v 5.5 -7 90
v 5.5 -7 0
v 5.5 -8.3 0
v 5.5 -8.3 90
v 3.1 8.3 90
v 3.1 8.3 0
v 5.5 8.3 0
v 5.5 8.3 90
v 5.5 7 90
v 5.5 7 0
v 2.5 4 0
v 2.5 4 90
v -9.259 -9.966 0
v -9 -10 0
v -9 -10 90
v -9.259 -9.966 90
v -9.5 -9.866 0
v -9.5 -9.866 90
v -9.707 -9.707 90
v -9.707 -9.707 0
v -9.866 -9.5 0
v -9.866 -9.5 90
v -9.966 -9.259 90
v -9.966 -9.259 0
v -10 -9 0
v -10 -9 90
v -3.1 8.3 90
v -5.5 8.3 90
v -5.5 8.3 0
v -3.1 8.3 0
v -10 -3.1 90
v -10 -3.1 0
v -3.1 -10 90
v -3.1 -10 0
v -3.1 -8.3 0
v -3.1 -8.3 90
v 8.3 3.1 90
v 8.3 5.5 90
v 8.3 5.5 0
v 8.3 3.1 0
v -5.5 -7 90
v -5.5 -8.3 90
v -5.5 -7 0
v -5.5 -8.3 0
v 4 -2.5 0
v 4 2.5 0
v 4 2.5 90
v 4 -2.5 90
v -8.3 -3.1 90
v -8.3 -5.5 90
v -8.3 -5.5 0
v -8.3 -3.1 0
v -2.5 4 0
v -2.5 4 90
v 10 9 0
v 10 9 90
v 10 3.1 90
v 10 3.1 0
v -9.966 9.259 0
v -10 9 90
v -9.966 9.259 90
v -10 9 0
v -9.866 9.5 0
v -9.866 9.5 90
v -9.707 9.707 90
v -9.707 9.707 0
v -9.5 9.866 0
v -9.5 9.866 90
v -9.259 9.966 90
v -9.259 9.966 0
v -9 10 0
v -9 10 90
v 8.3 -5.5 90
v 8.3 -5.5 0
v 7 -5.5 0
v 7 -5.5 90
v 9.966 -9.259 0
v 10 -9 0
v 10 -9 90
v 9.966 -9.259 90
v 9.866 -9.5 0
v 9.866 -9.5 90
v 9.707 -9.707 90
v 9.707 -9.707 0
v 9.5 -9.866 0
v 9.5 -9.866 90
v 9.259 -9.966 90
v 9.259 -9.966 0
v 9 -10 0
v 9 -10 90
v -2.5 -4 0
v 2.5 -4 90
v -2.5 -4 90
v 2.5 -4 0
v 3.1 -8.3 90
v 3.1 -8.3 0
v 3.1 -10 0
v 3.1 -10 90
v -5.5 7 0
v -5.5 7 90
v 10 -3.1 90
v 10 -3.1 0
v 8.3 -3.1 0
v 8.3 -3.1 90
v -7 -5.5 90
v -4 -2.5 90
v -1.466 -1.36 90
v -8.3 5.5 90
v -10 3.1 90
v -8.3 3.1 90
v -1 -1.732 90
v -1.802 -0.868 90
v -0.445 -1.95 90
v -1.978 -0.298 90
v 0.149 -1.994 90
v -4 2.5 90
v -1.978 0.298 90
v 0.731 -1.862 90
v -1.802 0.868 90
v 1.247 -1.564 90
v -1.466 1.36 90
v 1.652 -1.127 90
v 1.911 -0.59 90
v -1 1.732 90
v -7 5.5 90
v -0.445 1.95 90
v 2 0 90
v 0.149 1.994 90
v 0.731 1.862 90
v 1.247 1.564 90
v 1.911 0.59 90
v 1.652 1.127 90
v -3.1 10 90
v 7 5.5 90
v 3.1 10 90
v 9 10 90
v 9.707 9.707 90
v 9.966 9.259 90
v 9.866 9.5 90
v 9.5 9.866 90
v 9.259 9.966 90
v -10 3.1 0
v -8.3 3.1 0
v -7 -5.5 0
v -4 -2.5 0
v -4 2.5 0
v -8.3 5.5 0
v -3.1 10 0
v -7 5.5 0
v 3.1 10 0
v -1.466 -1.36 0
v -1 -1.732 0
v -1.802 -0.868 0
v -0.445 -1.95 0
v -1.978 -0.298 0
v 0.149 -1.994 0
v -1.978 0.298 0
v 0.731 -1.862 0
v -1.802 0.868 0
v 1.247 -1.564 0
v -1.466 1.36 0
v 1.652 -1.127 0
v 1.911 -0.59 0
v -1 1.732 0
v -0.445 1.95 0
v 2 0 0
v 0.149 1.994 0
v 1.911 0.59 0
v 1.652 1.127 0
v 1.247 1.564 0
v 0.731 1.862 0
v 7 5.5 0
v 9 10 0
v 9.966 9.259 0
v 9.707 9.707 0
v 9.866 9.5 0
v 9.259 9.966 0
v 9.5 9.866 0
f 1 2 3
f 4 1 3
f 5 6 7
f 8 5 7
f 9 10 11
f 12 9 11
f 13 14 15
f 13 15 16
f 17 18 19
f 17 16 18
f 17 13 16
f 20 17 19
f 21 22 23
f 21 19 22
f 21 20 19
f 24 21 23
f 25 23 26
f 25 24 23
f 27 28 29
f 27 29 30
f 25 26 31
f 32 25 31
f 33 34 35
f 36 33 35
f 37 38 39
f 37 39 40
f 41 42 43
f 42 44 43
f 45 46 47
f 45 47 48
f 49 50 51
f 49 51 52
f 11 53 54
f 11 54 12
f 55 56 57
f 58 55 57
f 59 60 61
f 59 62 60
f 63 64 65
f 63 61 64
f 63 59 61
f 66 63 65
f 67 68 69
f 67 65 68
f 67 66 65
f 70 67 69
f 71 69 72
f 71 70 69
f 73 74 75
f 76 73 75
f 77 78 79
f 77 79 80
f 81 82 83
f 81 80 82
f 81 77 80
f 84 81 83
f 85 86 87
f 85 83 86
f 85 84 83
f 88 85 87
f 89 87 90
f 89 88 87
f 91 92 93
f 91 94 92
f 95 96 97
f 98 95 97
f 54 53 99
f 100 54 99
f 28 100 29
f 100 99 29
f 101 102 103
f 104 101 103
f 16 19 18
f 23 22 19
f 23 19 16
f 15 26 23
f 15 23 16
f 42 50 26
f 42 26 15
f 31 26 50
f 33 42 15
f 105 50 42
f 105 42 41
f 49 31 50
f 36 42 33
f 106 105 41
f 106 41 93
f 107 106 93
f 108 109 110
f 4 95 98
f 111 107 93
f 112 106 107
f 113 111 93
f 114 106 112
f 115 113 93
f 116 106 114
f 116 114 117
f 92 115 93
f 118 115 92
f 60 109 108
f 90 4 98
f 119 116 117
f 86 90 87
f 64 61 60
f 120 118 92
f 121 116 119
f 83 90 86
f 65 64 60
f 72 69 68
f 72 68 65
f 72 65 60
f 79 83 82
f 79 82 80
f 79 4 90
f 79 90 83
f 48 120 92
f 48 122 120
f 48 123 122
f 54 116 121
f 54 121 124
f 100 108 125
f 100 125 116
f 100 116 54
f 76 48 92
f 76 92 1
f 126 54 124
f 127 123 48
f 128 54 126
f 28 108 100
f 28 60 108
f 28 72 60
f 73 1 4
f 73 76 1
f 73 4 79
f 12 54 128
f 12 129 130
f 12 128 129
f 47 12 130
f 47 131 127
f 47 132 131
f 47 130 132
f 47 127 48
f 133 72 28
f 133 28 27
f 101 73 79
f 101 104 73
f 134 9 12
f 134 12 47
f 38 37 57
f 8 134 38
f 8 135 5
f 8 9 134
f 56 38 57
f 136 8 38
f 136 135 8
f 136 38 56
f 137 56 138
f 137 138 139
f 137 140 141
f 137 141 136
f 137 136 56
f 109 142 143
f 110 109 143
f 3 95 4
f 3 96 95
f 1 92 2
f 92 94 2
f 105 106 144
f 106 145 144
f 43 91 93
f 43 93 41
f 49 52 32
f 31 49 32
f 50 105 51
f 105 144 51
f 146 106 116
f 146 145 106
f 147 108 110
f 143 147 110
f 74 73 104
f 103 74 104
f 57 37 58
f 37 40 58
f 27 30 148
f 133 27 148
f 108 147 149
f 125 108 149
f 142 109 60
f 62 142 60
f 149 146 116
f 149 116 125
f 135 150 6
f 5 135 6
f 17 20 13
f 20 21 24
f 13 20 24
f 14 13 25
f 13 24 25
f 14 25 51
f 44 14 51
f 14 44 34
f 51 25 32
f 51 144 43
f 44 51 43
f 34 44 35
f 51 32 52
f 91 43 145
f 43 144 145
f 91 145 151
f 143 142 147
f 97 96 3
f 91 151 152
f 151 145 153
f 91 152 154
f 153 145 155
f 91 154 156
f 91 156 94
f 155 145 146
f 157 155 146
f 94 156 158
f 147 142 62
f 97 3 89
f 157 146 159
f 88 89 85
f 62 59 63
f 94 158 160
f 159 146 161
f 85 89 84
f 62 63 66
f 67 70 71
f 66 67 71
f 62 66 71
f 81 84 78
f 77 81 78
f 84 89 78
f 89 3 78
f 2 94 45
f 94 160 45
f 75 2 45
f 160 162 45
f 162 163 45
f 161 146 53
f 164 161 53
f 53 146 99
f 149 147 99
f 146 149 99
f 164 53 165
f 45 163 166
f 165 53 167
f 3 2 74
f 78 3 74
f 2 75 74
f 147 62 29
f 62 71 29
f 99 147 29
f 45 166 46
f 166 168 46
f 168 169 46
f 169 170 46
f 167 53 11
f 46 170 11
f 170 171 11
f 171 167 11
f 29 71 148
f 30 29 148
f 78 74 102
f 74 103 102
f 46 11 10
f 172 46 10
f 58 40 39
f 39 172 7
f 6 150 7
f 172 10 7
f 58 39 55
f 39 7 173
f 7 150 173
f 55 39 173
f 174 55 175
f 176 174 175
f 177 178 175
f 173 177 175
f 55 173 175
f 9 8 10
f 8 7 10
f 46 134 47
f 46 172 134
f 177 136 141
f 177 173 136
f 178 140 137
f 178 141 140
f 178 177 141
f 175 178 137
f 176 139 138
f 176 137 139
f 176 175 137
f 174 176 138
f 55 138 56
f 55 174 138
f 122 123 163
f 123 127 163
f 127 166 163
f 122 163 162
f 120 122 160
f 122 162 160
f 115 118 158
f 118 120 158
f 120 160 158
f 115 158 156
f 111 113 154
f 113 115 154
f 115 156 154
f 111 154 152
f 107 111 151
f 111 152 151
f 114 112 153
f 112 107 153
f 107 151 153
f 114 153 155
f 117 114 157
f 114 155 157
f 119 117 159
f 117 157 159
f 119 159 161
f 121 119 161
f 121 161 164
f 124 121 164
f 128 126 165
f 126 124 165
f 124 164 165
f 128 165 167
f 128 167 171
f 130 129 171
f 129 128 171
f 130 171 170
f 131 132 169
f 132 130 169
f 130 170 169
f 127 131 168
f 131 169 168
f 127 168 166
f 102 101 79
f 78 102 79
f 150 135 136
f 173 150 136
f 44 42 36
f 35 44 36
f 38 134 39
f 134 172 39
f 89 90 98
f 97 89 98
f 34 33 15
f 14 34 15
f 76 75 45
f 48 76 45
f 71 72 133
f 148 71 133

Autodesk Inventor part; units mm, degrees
ref_plane "YZ Plane" through (0, 0, 0) normal (1, 0, 0) x (0, 1, 0)
ref_plane "XZ Plane" through (0, 0, 0) normal (0, 1, 0) x (-1, 0, 0)
ref_plane "XY Plane" through (0, 0, 0) normal (0, 0, 1) x (1, 0, 0)
sketch "Sketch1" plane through (0, 0, 0) normal (0, 0, 1) x (1, 0, 0)
  line L0 (-9, 10) -> (9, 10)
  line L1 (10, 9) -> (10, -9)
  line L2 (9, -10) -> (-9, -10)
  line L3 (-10, -9) -> (-10, 9)
  line L4 (-10, 10) -> (10, -10) construction
  line L5 (10, 10) -> (-10, -10) construction
  circle A0 centre (0, 0) radius 2
  line L6 (-4, 4) -> (4, 4)
  line L7 (4, 4) -> (4, -4)
  line L8 (4, -4) -> (-4, -4)
  line L9 (-4, -4) -> (-4, 4)
  line L10 (-4, 4) -> (4, -4) construction
  line L11 (4, 4) -> (-4, -4) construction
  arc A1 (-9, 10) -> (-10, 9) centre (-9, 9) ccw
  arc A2 (10, 9) -> (9, 10) centre (9, 9) ccw
  arc A3 (9, -10) -> (10, -9) centre (9, -9) ccw
  arc A4 (-10, -9) -> (-9, -10) centre (-9, -9) ccw
  line L12 (-3.1, 10) -> (3.1, 10)
  line L13 (3.1, 10) -> (3.1, -10)
  line L14 (3.1, -10) -> (-3.1, -10)
  line L15 (-3.1, -10) -> (-3.1, 10)
  line L16 (-10, 3.1) -> (10, 3.1)
  line L17 (10, 3.1) -> (10, -3.1)
  line L18 (10, -3.1) -> (-10, -3.1)
  line L19 (-10, -3.1) -> (-10, 3.1)
  line L20 (-5.5, 10) -> (5.5, 10)
  line L21 (5.5, 10) -> (5.5, -10)
  line L22 (5.5, -10) -> (-5.5, -10)
  line L23 (-5.5, -10) -> (-5.5, 10)
  line L24 (-10, 5.5) -> (10, 5.5)
  line L25 (10, 5.5) -> (10, -5.5)
  line L26 (10, -5.5) -> (-10, -5.5)
  line L27 (-10, -5.5) -> (-10, 5.5)
  line L28 (-8.3, 5.5) -> (-8.3, 3.1)
  line L29 (-8.3, -5.5) -> (-8.3, -3.1)
  line L30 (8.3, -5.5) -> (8.3, -3.1)
  line L31 (8.3, 5.5) -> (8.3, 3.1)
  line L32 (-5.5, 8.3) -> (-3.1, 8.3)
  line L33 (3.1, 8.3) -> (5.5, 8.3)
  line L34 (-5.5, -8.3) -> (-3.1, -8.3)
  line L35 (3.1, -8.3) -> (5.5, -8.3)
  line L36 (-4, 2.5) -> (-7, 5.5)
  line L37 (-4, 2.5) -> (0.2426, 2.5) construction
  line L38 (-4, -2.5) -> (-7, -5.5)
  line L39 (-4, -2.5) -> (0.2426, -2.5) construction
  line L40 (-2.5, 4) -> (-5.5, 7)
  line L41 (-2.5, 4) -> (1.7426, 4) construction
  line L42 (5.5, 7) -> (2.5, 4)
  line L43 (5.5, 7) -> (9.7426, 7) construction
  line L44 (7, 5.5) -> (4, 2.5)
  line L45 (7, 5.5) -> (11.2426, 5.5) construction
  line L46 (7, -5.5) -> (4, -2.5)
  line L47 (7, -5.5) -> (11.2426, -5.5) construction
  line L48 (2.5, -4) -> (5.5, -7)
  line L49 (2.5, -4) -> (6.7426, -4) construction
  line L50 (-2.5, -4) -> (-5.5, -7)
  line L51 (-2.5, -4) -> (1.7426, -4) construction
  point P0 (3.1, -3.1)
  point P1 (3.1, -5.5)
  point P2 (5.5, -5.5)
  point P3 (10, 3.1)
  point P4 (-5.5, -5.5)
  point P5 (-3.1, -5.5)
  point P6 (-3.1, -3.1)
  dimension "d0" = 20
  dimension "d1" = 20
  dimension "d2" = 4
  dimension "d3" = 8
  dimension "d4" = 8
  dimension "d5" = 1
  dimension "d6" = 6.2
  dimension "d7" = 3.1
  dimension "d8" = 6.2
  dimension "d9" = 3.1
  dimension "d10" = 11
  dimension "d11" = 5.5
  dimension "d12" = 11
  dimension "d13" = 5.5
  dimension "d14" = 4.3
  dimension "d15" = 4.3
  dimension "d16" = 4.3
  dimension "d17" = 4.3
  dimension "d18" = 135
  dimension "d19" = 135
  dimension "d20" = 135
  dimension "d21" = 135
  dimension "d22" = 135
  dimension "d23" = 135
  dimension "d24" = 1.3
  dimension "d25" = 1.3
  dimension "d26" = 1.3
  dimension "d27" = 1.3
  dimension "d28" = 1.3
  dimension "d29" = 1.3
  dimension "d32" = 45
  dimension "d33" = 135
  dimension "d34" = 1.3
  dimension "d35" = 1.3
extrude "Extrusion1" add sketch "Sketch1" along normal blind 90 contours L0 L23 L24 L3 A1 | L0 L15 L32 L23 | L24 L28 L16 L3 | L0 L21 L33 L13 | L40 L24 L23 | L0 A2 L1 L24 L21 | L24 L40 L15 L6 L9 L16 L36 L23 | L23 L36 L24 | L18 L29 L26 L3 | L40 L6 L15 | L26 L23 L2 A4 L3 | L21 L24 L42 | L42 L24 L21 L44 L16 L7 L6 L13 | L13 L6 L42 | L15 L16 L9 L6 | L6 L13 L16 L15 | L16 L9 L36 | L1 L16 L31 L24 | L24 L44 L21 | L6 L7 L16 L13 | L16 L13 L18 L15 | L15 L18 L9 L16 | L38 L23 L26 | L38 L9 L18 | L18 L9 L8 L15 L50 L26 L23 L38 | L16 L7 L18 L13 | L18 L13 L8 L15 | L15 L8 L9 L18 | L23 L34 L15 L2 | L26 L50 L23 | L1 L26 L30 L18 | L44 L7 L16 | L18 L7 L8 L13 | L8 L50 L15 | L1 A3 L2 L21 L26 | L13 L48 L8 | L8 L7 L18 L46 L21 L26 L48 L13 | L7 L46 L18 | L13 L35 L21 L2 | L46 L26 L21 | L21 L48 L26
equation "\"d7\" = 0.5 * d6"
equation "\"d8\" = d6"
equation "\"d9\" = 0.5 * d6"
equation "\"d11\" = 0.5 * d10"
equation "\"d12\" = d10"
equation "\"d13\" = 0.5 * d12"
properties part number "Aluminum_Profile_202090"
